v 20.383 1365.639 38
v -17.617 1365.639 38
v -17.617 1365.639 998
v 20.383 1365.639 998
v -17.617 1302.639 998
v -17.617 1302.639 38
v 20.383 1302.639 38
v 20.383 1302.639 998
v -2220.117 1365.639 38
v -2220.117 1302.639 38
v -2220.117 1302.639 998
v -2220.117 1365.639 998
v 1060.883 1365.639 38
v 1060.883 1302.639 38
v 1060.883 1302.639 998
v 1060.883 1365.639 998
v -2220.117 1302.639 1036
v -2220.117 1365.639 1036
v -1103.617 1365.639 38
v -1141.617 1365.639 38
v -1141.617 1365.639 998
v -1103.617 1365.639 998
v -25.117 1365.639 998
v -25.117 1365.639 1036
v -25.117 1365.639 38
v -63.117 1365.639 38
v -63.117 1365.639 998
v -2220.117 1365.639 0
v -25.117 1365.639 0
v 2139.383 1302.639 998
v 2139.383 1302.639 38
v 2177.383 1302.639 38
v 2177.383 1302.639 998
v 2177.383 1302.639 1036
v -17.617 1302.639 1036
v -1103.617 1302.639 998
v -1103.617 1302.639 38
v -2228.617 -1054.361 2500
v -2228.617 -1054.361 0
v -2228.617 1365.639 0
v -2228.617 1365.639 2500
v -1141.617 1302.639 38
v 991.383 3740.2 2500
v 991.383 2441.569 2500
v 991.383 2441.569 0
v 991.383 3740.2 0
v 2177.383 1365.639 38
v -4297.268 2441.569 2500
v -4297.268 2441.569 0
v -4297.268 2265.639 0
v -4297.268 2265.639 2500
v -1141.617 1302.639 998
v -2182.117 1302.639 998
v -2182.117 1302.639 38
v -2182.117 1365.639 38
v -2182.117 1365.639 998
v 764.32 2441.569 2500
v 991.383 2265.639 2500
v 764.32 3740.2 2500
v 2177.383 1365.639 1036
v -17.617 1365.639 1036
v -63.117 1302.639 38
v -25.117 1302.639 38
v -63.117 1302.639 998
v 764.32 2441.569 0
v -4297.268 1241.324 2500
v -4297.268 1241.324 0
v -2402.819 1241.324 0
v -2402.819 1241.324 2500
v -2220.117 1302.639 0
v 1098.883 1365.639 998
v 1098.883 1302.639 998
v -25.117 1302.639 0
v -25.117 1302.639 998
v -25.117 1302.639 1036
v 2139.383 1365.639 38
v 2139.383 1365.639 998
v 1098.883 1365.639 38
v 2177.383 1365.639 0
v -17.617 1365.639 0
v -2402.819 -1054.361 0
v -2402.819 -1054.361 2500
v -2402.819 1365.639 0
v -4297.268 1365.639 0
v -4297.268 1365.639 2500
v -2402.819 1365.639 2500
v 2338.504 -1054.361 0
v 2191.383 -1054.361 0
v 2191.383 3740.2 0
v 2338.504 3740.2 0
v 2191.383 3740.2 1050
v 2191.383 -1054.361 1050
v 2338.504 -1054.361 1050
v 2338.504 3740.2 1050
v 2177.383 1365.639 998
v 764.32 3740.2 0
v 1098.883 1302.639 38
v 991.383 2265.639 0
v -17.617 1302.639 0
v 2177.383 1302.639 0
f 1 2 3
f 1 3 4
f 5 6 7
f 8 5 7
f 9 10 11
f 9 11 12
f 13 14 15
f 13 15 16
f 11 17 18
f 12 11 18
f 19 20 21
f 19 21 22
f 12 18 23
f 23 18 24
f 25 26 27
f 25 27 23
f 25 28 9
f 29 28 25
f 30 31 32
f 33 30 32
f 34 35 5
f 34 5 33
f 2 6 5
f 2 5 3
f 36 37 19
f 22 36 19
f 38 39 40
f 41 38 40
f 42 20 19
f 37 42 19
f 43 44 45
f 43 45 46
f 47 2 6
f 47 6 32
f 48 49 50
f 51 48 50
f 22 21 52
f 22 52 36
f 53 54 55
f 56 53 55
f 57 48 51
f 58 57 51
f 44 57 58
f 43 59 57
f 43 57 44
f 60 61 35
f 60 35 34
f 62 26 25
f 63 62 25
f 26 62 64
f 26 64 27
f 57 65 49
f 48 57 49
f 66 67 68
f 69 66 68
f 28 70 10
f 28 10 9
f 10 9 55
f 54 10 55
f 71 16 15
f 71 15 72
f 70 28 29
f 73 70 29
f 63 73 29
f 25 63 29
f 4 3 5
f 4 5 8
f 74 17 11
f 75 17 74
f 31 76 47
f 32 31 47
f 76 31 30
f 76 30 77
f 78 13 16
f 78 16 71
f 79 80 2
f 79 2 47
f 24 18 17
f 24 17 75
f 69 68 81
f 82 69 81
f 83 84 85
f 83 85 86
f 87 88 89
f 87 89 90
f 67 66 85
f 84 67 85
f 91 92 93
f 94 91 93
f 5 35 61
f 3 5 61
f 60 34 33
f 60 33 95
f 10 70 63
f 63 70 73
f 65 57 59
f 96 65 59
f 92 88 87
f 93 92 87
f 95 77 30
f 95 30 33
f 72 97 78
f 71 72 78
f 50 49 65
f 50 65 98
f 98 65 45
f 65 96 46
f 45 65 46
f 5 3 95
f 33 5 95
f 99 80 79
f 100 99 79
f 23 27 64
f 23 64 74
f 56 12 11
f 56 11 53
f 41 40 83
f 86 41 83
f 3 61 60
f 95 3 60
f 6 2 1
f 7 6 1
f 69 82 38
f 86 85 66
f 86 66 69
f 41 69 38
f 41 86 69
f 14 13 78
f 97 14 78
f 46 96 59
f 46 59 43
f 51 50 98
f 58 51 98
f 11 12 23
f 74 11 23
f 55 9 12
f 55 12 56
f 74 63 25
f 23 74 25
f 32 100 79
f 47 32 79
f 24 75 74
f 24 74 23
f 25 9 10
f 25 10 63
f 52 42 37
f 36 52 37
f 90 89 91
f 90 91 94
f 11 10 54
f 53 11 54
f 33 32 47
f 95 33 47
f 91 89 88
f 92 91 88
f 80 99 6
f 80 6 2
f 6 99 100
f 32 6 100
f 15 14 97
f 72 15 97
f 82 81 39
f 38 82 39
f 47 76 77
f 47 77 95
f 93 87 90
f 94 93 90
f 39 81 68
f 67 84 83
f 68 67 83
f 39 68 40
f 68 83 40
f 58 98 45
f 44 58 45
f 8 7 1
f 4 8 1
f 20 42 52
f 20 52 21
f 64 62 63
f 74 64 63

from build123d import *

# Parameters (mm, degrees)
F0_W     = 1894.448854
F0_H     = 124.315219
F0_W_2   = 227.062435
F0_H_2   = 1298.63121
F1_DEPTH = 2500
F0_W_3   = 147.121081
F0_H_3   = 2420
F0_H_4   = 2374.560995
F2_DEPTH = 1050
F3_W     = 2195
F3_H     = 63
F4_DEPTH = 38
F5_DEPTH = 38
F6_W     = 38
F6_H     = 63
F7_DEPTH = 960


with BuildPart() as f1:
    # F0 (on Top) → F1 (new body)
    with BuildSketch(Plane.XY):
        Polygon((-2402.81906, 1241.32359), (-2402.81906, -1054.361191), (-2228.617251, -1054.361191), (-2228.617251, 1323.004286), (-2228.617251, 1365.638809), (-2402.81906, 1365.638809), align=None)
        Polygon((991.382749, 2265.638809), (991.382749, 2441.568594), (764.320314, 2441.568594), (-4297.267914, 2441.568594), (-4297.267914, 2265.638809), align=None)
        with Locations((-3350.043487, 1303.4812)):
            Rectangle(F0_W, F0_H)
        with Locations((877.851531, 3090.884199)):
            Rectangle(F0_W_2, F0_H_2)
    extrude(amount=F1_DEPTH)


with BuildPart() as f2:
    # F0 (on Top) → F2 (new body)
    with BuildSketch(Plane.XY):
        with Locations((2264.943289, 155.638809)):
            Rectangle(F0_W_3, F0_H_3)
        with Locations((2264.943289, 2552.919306)):
            Rectangle(F0_W_3, F0_H_4)
    extrude(amount=F2_DEPTH)


with BuildPart() as f4:
    # F3 (on Top) → F4 (new body)
    with BuildSketch(Plane.XY):
        with Locations((1079.882749, 1334.138809)):
            Rectangle(F3_W, F3_H)
    extrude(amount=F4_DEPTH)


with BuildPart() as f5:
    # F3 (on Top) → F5 (new body)
    with BuildSketch(Plane.XY):
        with Locations((-1122.617251, 1334.138809)):
            Rectangle(F3_W, F3_H)
    extrude(amount=F5_DEPTH)


with BuildPart() as f7:
    # F6 (on face) → F7 (new body)
    with BuildSketch(Plane.XY.offset(38)):
        with Locations((2158.382749, 1334.138809)):
            Rectangle(F6_W, F6_H)
        with Locations((1.382749, 1334.138809)):
            Rectangle(F6_W, F6_H)
        with Locations((-44.117251, 1334.138809)):
            Rectangle(F6_W, F6_H)
        with Locations((-2201.117251, 1334.138809)):
            Rectangle(F6_W, F6_H)
        with Locations((1079.882749, 1334.138809)):
            Rectangle(F6_W, F6_H)
        with Locations((-1122.617251, 1334.138809)):
            Rectangle(F6_W, F6_H)
    extrude(amount=F7_DEPTH)


with BuildPart() as f9_1:
    # F9: instance of F4
    add(f4.part.mirror(Plane(origin=(1619.132749, 1334.138809, 518), x_dir=(1, 0, 0), z_dir=(0, 0, 1))))


with BuildPart() as f9_2:
    # F9: instance of F5
    add(f5.part.mirror(Plane(origin=(1619.132749, 1334.138809, 518), x_dir=(1, 0, 0), z_dir=(0, 0, 1))))


solid = Compound([f1.part, f2.part, f4.part, f5.part, f7.part, f9_1.part, f9_2.part])
